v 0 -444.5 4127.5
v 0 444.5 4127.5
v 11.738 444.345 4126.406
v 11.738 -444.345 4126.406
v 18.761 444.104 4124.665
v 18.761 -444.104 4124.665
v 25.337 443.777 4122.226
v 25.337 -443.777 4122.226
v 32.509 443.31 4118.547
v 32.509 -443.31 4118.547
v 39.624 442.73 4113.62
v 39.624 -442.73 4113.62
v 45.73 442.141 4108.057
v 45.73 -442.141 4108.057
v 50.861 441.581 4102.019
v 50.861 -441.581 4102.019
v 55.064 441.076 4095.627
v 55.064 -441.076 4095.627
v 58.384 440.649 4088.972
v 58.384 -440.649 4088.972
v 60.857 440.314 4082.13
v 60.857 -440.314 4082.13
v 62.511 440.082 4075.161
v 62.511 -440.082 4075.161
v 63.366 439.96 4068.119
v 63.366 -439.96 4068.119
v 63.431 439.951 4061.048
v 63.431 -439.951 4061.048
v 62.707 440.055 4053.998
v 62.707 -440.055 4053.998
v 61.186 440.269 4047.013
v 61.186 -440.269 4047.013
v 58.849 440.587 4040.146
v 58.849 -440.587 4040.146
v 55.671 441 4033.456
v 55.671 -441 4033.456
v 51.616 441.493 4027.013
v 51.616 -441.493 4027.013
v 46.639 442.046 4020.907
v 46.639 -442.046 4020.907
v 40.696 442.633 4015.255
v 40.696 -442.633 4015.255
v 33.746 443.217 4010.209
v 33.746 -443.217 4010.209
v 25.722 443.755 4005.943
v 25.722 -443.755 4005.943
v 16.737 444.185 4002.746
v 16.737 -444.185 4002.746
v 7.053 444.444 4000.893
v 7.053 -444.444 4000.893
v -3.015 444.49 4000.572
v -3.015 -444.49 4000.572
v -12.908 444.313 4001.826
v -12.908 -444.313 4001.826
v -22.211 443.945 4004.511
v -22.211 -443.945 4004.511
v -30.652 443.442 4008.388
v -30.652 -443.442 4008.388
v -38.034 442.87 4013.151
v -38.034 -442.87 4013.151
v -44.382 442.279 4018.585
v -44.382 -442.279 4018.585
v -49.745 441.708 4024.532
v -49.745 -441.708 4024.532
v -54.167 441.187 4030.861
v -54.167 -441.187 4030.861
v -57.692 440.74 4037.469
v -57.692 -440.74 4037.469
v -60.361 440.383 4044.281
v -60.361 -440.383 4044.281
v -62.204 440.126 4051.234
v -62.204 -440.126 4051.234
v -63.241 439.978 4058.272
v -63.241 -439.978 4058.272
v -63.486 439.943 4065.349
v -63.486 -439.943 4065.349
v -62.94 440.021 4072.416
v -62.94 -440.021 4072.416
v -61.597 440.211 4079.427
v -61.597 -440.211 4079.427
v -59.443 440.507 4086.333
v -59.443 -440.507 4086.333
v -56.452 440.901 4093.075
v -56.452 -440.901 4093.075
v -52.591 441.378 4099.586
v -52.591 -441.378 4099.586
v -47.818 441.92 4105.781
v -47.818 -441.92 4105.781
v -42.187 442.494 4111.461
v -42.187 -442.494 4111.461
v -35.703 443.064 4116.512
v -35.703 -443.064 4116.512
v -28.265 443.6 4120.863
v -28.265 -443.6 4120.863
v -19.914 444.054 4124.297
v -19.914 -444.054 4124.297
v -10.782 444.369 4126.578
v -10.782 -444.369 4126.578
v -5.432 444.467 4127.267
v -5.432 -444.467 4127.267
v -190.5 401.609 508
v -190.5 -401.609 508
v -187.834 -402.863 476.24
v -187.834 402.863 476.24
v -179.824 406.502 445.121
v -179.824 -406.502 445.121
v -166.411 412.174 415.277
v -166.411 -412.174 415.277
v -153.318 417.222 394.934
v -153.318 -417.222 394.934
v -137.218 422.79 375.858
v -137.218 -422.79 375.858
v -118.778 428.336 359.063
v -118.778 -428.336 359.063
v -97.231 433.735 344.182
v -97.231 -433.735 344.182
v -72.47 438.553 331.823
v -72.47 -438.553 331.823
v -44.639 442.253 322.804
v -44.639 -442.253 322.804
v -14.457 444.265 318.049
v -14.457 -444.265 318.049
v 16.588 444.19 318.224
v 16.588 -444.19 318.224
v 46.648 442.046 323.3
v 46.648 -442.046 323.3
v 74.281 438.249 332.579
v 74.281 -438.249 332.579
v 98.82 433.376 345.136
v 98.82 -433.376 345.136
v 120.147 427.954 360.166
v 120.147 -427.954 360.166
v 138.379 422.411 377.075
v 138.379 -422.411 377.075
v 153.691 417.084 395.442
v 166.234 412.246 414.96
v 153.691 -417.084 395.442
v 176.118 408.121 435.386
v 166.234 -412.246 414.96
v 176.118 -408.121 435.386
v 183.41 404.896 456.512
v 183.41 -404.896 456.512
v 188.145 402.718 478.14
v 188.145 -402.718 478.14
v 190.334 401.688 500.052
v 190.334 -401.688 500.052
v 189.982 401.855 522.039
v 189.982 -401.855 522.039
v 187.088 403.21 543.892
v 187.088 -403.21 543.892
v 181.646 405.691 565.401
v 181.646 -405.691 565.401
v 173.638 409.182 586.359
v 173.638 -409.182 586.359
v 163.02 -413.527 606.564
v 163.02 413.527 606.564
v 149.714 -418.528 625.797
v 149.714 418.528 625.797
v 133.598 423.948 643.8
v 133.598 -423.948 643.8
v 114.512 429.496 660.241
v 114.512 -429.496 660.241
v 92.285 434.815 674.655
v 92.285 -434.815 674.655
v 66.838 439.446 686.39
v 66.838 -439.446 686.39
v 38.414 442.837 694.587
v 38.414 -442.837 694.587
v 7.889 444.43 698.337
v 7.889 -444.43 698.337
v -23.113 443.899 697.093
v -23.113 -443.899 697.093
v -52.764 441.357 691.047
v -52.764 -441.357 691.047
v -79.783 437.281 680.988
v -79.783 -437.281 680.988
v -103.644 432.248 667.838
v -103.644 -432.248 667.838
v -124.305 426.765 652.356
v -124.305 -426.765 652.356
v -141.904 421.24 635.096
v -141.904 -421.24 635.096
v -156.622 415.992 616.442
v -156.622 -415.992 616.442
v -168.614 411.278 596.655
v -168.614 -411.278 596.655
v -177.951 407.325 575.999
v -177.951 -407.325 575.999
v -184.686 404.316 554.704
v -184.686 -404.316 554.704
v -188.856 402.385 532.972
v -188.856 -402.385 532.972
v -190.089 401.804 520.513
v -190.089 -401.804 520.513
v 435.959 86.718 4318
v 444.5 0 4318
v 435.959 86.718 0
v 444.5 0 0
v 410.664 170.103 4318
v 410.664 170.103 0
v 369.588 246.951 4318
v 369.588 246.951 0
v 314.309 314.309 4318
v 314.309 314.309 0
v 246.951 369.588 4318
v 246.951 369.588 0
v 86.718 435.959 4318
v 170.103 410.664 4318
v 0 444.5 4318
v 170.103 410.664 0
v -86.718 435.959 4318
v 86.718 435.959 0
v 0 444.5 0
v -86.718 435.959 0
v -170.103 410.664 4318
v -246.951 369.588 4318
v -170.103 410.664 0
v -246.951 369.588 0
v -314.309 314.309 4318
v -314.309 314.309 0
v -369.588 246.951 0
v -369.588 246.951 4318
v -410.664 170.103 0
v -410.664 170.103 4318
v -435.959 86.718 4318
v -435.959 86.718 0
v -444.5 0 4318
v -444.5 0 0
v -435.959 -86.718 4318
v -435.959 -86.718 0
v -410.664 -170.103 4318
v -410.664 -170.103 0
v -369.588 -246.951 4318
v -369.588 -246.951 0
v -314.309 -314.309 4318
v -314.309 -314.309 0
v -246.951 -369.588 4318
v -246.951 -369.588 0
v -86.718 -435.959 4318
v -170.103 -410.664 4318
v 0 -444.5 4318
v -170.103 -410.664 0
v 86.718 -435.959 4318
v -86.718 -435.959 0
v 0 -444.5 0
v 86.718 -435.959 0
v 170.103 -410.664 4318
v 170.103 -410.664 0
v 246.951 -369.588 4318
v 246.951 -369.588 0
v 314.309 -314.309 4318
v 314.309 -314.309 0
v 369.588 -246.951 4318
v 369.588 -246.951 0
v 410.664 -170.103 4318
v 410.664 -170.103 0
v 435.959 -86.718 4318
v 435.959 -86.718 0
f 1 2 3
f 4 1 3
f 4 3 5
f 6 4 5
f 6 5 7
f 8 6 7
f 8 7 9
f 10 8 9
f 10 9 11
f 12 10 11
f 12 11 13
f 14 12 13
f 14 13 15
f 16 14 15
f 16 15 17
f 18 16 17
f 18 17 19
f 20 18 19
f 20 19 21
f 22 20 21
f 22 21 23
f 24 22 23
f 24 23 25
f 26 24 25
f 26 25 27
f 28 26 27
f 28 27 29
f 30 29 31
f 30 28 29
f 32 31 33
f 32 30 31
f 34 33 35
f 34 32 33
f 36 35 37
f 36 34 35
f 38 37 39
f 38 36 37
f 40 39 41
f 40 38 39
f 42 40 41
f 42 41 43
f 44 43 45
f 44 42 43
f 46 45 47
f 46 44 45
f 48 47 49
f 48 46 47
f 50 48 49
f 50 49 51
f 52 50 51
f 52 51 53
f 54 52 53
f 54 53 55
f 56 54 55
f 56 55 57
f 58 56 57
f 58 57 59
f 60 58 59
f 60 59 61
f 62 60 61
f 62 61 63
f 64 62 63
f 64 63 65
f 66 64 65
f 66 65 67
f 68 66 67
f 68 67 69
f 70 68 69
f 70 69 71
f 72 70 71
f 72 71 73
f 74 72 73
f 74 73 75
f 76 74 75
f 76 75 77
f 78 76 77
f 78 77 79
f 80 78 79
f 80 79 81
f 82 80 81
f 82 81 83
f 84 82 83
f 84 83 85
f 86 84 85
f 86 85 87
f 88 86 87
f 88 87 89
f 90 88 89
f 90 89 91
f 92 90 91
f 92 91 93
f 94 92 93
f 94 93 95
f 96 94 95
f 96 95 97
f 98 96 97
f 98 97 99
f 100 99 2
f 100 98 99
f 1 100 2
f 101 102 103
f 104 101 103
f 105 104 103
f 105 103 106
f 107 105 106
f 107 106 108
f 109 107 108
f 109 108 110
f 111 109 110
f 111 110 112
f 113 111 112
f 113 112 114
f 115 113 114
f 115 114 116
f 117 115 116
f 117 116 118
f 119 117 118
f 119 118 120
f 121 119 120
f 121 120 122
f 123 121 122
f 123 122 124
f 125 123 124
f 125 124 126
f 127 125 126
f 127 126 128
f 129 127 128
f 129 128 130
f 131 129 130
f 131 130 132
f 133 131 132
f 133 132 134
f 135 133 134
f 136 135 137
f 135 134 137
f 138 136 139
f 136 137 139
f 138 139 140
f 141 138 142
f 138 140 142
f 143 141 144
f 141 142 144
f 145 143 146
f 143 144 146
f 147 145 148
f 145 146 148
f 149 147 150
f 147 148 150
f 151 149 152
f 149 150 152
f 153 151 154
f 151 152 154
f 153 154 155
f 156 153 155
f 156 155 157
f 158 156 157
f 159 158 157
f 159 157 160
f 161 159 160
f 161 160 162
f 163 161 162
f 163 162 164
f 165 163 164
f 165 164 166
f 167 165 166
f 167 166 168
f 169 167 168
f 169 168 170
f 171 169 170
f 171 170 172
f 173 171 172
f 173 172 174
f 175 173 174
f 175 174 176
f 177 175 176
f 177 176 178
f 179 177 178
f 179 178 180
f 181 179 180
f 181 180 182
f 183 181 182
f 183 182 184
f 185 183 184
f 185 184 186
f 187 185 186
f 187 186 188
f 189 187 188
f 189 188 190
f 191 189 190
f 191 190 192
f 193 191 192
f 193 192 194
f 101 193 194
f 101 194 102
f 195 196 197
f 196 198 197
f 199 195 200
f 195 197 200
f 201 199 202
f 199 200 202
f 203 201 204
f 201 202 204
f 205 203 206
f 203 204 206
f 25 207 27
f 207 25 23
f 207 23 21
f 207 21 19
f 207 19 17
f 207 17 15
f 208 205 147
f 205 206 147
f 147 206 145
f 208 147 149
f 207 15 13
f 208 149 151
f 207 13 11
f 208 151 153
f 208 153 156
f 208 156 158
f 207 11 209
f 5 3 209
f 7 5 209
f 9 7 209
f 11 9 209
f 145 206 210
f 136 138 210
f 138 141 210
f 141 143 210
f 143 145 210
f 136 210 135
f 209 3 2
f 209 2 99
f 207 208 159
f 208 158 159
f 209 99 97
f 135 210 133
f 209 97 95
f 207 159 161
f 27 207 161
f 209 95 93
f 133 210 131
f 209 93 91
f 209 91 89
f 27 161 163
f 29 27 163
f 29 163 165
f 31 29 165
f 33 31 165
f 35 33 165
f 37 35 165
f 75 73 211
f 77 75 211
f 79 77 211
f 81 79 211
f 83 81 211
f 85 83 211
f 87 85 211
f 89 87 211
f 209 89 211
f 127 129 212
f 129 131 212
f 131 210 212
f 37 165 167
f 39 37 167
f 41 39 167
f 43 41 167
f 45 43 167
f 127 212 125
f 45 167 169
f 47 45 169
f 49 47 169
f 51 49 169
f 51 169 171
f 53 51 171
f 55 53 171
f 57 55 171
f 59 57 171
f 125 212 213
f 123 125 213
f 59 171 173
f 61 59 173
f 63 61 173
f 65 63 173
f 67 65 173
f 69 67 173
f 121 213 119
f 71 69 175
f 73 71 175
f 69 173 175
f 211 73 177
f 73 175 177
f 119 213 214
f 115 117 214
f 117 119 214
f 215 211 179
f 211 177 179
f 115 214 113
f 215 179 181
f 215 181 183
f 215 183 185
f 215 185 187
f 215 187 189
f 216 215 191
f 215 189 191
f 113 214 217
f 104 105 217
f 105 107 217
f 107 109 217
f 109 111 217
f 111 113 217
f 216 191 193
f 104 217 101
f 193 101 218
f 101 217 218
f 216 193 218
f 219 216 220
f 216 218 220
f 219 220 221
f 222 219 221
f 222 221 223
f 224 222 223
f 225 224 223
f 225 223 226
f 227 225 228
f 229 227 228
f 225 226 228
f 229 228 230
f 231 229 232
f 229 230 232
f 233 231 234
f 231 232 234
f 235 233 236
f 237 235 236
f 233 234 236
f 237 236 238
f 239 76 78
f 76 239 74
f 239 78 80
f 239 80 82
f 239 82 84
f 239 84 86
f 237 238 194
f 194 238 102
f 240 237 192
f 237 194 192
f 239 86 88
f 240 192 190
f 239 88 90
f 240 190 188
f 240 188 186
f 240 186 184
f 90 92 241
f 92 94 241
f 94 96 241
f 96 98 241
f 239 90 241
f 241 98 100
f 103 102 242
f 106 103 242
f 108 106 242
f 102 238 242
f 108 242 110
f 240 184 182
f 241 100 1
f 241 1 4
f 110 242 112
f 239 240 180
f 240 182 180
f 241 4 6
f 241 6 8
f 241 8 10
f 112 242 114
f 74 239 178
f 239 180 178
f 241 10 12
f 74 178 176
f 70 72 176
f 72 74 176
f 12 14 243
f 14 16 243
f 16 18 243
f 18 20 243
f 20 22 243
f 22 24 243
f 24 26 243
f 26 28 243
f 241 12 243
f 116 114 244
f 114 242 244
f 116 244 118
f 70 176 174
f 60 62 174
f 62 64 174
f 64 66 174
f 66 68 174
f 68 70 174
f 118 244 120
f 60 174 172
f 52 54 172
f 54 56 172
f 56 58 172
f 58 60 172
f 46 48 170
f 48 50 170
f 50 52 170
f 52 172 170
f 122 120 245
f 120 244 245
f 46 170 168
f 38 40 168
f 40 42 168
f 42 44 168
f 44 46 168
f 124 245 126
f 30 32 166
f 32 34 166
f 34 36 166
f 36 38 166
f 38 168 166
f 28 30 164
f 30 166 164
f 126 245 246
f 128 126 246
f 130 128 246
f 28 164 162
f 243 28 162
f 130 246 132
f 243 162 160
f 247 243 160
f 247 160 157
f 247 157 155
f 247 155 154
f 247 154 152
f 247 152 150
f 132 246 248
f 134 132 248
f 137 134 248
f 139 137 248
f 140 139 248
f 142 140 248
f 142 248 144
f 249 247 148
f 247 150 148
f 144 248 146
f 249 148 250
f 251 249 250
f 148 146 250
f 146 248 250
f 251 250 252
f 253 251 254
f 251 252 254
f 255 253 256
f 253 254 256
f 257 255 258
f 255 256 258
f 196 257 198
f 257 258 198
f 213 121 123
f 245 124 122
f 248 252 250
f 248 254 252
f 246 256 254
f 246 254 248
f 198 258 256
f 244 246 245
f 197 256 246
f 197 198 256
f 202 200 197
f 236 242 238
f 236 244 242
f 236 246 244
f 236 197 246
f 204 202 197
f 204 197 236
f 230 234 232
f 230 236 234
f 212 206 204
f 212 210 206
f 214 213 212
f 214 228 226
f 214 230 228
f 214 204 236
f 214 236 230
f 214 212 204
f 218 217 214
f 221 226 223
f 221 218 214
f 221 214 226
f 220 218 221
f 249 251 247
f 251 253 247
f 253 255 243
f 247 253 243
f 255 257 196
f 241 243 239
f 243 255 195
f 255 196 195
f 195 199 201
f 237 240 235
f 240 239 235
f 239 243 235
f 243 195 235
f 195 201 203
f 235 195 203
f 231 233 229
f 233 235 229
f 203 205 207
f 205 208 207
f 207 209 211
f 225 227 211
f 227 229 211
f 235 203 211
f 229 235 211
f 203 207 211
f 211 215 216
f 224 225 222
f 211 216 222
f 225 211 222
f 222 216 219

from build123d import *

# Parameters (mm, degrees)
SKETCH1_W               = 444.5
SKETCH1_H               = 4318
HOLE1_D                 = 381
CUT_EXTRUDE1_DEPTH      = 4364.517445942
CUT_EXTRUDE1_DEPTH_BACK = 4364.517445942
SKETCH4_R               = 63.5


with BuildPart() as part:
    # Sketch1 → Revolve1 (revolve)
    with BuildSketch(Plane(origin=(0, 0, 0), x_dir=(1, 0, 0), z_dir=(0, 1, 0))):
        with Locations((222.25, -2159)):
            Rectangle(SKETCH1_W, SKETCH1_H)
    revolve(axis=Axis((0, 0, 0), (0, 0, 1)))

    # Hole1 (through all)
    with Locations(Plane(origin=(0, 444.5, 508), x_dir=(1, 0, 0), z_dir=(0, 1, 0))):
        with Locations((0, 0)):
            Hole(HOLE1_D / 2)

    # Sketch4 → Cut-Extrude1 (cut, two sides: drawn at the far end of the back side and taken through both)
    with BuildSketch(Plane(origin=(0, 0, 0), x_dir=(1, 0, 0), z_dir=(0, 1, 0)).offset(-CUT_EXTRUDE1_DEPTH_BACK)):
        with Locations(Location((0, -4064, 0), (0, 0, 270))):
            Circle(SKETCH4_R)
    extrude(amount=CUT_EXTRUDE1_DEPTH + CUT_EXTRUDE1_DEPTH_BACK, mode=Mode.SUBTRACT)


solid = part.part
